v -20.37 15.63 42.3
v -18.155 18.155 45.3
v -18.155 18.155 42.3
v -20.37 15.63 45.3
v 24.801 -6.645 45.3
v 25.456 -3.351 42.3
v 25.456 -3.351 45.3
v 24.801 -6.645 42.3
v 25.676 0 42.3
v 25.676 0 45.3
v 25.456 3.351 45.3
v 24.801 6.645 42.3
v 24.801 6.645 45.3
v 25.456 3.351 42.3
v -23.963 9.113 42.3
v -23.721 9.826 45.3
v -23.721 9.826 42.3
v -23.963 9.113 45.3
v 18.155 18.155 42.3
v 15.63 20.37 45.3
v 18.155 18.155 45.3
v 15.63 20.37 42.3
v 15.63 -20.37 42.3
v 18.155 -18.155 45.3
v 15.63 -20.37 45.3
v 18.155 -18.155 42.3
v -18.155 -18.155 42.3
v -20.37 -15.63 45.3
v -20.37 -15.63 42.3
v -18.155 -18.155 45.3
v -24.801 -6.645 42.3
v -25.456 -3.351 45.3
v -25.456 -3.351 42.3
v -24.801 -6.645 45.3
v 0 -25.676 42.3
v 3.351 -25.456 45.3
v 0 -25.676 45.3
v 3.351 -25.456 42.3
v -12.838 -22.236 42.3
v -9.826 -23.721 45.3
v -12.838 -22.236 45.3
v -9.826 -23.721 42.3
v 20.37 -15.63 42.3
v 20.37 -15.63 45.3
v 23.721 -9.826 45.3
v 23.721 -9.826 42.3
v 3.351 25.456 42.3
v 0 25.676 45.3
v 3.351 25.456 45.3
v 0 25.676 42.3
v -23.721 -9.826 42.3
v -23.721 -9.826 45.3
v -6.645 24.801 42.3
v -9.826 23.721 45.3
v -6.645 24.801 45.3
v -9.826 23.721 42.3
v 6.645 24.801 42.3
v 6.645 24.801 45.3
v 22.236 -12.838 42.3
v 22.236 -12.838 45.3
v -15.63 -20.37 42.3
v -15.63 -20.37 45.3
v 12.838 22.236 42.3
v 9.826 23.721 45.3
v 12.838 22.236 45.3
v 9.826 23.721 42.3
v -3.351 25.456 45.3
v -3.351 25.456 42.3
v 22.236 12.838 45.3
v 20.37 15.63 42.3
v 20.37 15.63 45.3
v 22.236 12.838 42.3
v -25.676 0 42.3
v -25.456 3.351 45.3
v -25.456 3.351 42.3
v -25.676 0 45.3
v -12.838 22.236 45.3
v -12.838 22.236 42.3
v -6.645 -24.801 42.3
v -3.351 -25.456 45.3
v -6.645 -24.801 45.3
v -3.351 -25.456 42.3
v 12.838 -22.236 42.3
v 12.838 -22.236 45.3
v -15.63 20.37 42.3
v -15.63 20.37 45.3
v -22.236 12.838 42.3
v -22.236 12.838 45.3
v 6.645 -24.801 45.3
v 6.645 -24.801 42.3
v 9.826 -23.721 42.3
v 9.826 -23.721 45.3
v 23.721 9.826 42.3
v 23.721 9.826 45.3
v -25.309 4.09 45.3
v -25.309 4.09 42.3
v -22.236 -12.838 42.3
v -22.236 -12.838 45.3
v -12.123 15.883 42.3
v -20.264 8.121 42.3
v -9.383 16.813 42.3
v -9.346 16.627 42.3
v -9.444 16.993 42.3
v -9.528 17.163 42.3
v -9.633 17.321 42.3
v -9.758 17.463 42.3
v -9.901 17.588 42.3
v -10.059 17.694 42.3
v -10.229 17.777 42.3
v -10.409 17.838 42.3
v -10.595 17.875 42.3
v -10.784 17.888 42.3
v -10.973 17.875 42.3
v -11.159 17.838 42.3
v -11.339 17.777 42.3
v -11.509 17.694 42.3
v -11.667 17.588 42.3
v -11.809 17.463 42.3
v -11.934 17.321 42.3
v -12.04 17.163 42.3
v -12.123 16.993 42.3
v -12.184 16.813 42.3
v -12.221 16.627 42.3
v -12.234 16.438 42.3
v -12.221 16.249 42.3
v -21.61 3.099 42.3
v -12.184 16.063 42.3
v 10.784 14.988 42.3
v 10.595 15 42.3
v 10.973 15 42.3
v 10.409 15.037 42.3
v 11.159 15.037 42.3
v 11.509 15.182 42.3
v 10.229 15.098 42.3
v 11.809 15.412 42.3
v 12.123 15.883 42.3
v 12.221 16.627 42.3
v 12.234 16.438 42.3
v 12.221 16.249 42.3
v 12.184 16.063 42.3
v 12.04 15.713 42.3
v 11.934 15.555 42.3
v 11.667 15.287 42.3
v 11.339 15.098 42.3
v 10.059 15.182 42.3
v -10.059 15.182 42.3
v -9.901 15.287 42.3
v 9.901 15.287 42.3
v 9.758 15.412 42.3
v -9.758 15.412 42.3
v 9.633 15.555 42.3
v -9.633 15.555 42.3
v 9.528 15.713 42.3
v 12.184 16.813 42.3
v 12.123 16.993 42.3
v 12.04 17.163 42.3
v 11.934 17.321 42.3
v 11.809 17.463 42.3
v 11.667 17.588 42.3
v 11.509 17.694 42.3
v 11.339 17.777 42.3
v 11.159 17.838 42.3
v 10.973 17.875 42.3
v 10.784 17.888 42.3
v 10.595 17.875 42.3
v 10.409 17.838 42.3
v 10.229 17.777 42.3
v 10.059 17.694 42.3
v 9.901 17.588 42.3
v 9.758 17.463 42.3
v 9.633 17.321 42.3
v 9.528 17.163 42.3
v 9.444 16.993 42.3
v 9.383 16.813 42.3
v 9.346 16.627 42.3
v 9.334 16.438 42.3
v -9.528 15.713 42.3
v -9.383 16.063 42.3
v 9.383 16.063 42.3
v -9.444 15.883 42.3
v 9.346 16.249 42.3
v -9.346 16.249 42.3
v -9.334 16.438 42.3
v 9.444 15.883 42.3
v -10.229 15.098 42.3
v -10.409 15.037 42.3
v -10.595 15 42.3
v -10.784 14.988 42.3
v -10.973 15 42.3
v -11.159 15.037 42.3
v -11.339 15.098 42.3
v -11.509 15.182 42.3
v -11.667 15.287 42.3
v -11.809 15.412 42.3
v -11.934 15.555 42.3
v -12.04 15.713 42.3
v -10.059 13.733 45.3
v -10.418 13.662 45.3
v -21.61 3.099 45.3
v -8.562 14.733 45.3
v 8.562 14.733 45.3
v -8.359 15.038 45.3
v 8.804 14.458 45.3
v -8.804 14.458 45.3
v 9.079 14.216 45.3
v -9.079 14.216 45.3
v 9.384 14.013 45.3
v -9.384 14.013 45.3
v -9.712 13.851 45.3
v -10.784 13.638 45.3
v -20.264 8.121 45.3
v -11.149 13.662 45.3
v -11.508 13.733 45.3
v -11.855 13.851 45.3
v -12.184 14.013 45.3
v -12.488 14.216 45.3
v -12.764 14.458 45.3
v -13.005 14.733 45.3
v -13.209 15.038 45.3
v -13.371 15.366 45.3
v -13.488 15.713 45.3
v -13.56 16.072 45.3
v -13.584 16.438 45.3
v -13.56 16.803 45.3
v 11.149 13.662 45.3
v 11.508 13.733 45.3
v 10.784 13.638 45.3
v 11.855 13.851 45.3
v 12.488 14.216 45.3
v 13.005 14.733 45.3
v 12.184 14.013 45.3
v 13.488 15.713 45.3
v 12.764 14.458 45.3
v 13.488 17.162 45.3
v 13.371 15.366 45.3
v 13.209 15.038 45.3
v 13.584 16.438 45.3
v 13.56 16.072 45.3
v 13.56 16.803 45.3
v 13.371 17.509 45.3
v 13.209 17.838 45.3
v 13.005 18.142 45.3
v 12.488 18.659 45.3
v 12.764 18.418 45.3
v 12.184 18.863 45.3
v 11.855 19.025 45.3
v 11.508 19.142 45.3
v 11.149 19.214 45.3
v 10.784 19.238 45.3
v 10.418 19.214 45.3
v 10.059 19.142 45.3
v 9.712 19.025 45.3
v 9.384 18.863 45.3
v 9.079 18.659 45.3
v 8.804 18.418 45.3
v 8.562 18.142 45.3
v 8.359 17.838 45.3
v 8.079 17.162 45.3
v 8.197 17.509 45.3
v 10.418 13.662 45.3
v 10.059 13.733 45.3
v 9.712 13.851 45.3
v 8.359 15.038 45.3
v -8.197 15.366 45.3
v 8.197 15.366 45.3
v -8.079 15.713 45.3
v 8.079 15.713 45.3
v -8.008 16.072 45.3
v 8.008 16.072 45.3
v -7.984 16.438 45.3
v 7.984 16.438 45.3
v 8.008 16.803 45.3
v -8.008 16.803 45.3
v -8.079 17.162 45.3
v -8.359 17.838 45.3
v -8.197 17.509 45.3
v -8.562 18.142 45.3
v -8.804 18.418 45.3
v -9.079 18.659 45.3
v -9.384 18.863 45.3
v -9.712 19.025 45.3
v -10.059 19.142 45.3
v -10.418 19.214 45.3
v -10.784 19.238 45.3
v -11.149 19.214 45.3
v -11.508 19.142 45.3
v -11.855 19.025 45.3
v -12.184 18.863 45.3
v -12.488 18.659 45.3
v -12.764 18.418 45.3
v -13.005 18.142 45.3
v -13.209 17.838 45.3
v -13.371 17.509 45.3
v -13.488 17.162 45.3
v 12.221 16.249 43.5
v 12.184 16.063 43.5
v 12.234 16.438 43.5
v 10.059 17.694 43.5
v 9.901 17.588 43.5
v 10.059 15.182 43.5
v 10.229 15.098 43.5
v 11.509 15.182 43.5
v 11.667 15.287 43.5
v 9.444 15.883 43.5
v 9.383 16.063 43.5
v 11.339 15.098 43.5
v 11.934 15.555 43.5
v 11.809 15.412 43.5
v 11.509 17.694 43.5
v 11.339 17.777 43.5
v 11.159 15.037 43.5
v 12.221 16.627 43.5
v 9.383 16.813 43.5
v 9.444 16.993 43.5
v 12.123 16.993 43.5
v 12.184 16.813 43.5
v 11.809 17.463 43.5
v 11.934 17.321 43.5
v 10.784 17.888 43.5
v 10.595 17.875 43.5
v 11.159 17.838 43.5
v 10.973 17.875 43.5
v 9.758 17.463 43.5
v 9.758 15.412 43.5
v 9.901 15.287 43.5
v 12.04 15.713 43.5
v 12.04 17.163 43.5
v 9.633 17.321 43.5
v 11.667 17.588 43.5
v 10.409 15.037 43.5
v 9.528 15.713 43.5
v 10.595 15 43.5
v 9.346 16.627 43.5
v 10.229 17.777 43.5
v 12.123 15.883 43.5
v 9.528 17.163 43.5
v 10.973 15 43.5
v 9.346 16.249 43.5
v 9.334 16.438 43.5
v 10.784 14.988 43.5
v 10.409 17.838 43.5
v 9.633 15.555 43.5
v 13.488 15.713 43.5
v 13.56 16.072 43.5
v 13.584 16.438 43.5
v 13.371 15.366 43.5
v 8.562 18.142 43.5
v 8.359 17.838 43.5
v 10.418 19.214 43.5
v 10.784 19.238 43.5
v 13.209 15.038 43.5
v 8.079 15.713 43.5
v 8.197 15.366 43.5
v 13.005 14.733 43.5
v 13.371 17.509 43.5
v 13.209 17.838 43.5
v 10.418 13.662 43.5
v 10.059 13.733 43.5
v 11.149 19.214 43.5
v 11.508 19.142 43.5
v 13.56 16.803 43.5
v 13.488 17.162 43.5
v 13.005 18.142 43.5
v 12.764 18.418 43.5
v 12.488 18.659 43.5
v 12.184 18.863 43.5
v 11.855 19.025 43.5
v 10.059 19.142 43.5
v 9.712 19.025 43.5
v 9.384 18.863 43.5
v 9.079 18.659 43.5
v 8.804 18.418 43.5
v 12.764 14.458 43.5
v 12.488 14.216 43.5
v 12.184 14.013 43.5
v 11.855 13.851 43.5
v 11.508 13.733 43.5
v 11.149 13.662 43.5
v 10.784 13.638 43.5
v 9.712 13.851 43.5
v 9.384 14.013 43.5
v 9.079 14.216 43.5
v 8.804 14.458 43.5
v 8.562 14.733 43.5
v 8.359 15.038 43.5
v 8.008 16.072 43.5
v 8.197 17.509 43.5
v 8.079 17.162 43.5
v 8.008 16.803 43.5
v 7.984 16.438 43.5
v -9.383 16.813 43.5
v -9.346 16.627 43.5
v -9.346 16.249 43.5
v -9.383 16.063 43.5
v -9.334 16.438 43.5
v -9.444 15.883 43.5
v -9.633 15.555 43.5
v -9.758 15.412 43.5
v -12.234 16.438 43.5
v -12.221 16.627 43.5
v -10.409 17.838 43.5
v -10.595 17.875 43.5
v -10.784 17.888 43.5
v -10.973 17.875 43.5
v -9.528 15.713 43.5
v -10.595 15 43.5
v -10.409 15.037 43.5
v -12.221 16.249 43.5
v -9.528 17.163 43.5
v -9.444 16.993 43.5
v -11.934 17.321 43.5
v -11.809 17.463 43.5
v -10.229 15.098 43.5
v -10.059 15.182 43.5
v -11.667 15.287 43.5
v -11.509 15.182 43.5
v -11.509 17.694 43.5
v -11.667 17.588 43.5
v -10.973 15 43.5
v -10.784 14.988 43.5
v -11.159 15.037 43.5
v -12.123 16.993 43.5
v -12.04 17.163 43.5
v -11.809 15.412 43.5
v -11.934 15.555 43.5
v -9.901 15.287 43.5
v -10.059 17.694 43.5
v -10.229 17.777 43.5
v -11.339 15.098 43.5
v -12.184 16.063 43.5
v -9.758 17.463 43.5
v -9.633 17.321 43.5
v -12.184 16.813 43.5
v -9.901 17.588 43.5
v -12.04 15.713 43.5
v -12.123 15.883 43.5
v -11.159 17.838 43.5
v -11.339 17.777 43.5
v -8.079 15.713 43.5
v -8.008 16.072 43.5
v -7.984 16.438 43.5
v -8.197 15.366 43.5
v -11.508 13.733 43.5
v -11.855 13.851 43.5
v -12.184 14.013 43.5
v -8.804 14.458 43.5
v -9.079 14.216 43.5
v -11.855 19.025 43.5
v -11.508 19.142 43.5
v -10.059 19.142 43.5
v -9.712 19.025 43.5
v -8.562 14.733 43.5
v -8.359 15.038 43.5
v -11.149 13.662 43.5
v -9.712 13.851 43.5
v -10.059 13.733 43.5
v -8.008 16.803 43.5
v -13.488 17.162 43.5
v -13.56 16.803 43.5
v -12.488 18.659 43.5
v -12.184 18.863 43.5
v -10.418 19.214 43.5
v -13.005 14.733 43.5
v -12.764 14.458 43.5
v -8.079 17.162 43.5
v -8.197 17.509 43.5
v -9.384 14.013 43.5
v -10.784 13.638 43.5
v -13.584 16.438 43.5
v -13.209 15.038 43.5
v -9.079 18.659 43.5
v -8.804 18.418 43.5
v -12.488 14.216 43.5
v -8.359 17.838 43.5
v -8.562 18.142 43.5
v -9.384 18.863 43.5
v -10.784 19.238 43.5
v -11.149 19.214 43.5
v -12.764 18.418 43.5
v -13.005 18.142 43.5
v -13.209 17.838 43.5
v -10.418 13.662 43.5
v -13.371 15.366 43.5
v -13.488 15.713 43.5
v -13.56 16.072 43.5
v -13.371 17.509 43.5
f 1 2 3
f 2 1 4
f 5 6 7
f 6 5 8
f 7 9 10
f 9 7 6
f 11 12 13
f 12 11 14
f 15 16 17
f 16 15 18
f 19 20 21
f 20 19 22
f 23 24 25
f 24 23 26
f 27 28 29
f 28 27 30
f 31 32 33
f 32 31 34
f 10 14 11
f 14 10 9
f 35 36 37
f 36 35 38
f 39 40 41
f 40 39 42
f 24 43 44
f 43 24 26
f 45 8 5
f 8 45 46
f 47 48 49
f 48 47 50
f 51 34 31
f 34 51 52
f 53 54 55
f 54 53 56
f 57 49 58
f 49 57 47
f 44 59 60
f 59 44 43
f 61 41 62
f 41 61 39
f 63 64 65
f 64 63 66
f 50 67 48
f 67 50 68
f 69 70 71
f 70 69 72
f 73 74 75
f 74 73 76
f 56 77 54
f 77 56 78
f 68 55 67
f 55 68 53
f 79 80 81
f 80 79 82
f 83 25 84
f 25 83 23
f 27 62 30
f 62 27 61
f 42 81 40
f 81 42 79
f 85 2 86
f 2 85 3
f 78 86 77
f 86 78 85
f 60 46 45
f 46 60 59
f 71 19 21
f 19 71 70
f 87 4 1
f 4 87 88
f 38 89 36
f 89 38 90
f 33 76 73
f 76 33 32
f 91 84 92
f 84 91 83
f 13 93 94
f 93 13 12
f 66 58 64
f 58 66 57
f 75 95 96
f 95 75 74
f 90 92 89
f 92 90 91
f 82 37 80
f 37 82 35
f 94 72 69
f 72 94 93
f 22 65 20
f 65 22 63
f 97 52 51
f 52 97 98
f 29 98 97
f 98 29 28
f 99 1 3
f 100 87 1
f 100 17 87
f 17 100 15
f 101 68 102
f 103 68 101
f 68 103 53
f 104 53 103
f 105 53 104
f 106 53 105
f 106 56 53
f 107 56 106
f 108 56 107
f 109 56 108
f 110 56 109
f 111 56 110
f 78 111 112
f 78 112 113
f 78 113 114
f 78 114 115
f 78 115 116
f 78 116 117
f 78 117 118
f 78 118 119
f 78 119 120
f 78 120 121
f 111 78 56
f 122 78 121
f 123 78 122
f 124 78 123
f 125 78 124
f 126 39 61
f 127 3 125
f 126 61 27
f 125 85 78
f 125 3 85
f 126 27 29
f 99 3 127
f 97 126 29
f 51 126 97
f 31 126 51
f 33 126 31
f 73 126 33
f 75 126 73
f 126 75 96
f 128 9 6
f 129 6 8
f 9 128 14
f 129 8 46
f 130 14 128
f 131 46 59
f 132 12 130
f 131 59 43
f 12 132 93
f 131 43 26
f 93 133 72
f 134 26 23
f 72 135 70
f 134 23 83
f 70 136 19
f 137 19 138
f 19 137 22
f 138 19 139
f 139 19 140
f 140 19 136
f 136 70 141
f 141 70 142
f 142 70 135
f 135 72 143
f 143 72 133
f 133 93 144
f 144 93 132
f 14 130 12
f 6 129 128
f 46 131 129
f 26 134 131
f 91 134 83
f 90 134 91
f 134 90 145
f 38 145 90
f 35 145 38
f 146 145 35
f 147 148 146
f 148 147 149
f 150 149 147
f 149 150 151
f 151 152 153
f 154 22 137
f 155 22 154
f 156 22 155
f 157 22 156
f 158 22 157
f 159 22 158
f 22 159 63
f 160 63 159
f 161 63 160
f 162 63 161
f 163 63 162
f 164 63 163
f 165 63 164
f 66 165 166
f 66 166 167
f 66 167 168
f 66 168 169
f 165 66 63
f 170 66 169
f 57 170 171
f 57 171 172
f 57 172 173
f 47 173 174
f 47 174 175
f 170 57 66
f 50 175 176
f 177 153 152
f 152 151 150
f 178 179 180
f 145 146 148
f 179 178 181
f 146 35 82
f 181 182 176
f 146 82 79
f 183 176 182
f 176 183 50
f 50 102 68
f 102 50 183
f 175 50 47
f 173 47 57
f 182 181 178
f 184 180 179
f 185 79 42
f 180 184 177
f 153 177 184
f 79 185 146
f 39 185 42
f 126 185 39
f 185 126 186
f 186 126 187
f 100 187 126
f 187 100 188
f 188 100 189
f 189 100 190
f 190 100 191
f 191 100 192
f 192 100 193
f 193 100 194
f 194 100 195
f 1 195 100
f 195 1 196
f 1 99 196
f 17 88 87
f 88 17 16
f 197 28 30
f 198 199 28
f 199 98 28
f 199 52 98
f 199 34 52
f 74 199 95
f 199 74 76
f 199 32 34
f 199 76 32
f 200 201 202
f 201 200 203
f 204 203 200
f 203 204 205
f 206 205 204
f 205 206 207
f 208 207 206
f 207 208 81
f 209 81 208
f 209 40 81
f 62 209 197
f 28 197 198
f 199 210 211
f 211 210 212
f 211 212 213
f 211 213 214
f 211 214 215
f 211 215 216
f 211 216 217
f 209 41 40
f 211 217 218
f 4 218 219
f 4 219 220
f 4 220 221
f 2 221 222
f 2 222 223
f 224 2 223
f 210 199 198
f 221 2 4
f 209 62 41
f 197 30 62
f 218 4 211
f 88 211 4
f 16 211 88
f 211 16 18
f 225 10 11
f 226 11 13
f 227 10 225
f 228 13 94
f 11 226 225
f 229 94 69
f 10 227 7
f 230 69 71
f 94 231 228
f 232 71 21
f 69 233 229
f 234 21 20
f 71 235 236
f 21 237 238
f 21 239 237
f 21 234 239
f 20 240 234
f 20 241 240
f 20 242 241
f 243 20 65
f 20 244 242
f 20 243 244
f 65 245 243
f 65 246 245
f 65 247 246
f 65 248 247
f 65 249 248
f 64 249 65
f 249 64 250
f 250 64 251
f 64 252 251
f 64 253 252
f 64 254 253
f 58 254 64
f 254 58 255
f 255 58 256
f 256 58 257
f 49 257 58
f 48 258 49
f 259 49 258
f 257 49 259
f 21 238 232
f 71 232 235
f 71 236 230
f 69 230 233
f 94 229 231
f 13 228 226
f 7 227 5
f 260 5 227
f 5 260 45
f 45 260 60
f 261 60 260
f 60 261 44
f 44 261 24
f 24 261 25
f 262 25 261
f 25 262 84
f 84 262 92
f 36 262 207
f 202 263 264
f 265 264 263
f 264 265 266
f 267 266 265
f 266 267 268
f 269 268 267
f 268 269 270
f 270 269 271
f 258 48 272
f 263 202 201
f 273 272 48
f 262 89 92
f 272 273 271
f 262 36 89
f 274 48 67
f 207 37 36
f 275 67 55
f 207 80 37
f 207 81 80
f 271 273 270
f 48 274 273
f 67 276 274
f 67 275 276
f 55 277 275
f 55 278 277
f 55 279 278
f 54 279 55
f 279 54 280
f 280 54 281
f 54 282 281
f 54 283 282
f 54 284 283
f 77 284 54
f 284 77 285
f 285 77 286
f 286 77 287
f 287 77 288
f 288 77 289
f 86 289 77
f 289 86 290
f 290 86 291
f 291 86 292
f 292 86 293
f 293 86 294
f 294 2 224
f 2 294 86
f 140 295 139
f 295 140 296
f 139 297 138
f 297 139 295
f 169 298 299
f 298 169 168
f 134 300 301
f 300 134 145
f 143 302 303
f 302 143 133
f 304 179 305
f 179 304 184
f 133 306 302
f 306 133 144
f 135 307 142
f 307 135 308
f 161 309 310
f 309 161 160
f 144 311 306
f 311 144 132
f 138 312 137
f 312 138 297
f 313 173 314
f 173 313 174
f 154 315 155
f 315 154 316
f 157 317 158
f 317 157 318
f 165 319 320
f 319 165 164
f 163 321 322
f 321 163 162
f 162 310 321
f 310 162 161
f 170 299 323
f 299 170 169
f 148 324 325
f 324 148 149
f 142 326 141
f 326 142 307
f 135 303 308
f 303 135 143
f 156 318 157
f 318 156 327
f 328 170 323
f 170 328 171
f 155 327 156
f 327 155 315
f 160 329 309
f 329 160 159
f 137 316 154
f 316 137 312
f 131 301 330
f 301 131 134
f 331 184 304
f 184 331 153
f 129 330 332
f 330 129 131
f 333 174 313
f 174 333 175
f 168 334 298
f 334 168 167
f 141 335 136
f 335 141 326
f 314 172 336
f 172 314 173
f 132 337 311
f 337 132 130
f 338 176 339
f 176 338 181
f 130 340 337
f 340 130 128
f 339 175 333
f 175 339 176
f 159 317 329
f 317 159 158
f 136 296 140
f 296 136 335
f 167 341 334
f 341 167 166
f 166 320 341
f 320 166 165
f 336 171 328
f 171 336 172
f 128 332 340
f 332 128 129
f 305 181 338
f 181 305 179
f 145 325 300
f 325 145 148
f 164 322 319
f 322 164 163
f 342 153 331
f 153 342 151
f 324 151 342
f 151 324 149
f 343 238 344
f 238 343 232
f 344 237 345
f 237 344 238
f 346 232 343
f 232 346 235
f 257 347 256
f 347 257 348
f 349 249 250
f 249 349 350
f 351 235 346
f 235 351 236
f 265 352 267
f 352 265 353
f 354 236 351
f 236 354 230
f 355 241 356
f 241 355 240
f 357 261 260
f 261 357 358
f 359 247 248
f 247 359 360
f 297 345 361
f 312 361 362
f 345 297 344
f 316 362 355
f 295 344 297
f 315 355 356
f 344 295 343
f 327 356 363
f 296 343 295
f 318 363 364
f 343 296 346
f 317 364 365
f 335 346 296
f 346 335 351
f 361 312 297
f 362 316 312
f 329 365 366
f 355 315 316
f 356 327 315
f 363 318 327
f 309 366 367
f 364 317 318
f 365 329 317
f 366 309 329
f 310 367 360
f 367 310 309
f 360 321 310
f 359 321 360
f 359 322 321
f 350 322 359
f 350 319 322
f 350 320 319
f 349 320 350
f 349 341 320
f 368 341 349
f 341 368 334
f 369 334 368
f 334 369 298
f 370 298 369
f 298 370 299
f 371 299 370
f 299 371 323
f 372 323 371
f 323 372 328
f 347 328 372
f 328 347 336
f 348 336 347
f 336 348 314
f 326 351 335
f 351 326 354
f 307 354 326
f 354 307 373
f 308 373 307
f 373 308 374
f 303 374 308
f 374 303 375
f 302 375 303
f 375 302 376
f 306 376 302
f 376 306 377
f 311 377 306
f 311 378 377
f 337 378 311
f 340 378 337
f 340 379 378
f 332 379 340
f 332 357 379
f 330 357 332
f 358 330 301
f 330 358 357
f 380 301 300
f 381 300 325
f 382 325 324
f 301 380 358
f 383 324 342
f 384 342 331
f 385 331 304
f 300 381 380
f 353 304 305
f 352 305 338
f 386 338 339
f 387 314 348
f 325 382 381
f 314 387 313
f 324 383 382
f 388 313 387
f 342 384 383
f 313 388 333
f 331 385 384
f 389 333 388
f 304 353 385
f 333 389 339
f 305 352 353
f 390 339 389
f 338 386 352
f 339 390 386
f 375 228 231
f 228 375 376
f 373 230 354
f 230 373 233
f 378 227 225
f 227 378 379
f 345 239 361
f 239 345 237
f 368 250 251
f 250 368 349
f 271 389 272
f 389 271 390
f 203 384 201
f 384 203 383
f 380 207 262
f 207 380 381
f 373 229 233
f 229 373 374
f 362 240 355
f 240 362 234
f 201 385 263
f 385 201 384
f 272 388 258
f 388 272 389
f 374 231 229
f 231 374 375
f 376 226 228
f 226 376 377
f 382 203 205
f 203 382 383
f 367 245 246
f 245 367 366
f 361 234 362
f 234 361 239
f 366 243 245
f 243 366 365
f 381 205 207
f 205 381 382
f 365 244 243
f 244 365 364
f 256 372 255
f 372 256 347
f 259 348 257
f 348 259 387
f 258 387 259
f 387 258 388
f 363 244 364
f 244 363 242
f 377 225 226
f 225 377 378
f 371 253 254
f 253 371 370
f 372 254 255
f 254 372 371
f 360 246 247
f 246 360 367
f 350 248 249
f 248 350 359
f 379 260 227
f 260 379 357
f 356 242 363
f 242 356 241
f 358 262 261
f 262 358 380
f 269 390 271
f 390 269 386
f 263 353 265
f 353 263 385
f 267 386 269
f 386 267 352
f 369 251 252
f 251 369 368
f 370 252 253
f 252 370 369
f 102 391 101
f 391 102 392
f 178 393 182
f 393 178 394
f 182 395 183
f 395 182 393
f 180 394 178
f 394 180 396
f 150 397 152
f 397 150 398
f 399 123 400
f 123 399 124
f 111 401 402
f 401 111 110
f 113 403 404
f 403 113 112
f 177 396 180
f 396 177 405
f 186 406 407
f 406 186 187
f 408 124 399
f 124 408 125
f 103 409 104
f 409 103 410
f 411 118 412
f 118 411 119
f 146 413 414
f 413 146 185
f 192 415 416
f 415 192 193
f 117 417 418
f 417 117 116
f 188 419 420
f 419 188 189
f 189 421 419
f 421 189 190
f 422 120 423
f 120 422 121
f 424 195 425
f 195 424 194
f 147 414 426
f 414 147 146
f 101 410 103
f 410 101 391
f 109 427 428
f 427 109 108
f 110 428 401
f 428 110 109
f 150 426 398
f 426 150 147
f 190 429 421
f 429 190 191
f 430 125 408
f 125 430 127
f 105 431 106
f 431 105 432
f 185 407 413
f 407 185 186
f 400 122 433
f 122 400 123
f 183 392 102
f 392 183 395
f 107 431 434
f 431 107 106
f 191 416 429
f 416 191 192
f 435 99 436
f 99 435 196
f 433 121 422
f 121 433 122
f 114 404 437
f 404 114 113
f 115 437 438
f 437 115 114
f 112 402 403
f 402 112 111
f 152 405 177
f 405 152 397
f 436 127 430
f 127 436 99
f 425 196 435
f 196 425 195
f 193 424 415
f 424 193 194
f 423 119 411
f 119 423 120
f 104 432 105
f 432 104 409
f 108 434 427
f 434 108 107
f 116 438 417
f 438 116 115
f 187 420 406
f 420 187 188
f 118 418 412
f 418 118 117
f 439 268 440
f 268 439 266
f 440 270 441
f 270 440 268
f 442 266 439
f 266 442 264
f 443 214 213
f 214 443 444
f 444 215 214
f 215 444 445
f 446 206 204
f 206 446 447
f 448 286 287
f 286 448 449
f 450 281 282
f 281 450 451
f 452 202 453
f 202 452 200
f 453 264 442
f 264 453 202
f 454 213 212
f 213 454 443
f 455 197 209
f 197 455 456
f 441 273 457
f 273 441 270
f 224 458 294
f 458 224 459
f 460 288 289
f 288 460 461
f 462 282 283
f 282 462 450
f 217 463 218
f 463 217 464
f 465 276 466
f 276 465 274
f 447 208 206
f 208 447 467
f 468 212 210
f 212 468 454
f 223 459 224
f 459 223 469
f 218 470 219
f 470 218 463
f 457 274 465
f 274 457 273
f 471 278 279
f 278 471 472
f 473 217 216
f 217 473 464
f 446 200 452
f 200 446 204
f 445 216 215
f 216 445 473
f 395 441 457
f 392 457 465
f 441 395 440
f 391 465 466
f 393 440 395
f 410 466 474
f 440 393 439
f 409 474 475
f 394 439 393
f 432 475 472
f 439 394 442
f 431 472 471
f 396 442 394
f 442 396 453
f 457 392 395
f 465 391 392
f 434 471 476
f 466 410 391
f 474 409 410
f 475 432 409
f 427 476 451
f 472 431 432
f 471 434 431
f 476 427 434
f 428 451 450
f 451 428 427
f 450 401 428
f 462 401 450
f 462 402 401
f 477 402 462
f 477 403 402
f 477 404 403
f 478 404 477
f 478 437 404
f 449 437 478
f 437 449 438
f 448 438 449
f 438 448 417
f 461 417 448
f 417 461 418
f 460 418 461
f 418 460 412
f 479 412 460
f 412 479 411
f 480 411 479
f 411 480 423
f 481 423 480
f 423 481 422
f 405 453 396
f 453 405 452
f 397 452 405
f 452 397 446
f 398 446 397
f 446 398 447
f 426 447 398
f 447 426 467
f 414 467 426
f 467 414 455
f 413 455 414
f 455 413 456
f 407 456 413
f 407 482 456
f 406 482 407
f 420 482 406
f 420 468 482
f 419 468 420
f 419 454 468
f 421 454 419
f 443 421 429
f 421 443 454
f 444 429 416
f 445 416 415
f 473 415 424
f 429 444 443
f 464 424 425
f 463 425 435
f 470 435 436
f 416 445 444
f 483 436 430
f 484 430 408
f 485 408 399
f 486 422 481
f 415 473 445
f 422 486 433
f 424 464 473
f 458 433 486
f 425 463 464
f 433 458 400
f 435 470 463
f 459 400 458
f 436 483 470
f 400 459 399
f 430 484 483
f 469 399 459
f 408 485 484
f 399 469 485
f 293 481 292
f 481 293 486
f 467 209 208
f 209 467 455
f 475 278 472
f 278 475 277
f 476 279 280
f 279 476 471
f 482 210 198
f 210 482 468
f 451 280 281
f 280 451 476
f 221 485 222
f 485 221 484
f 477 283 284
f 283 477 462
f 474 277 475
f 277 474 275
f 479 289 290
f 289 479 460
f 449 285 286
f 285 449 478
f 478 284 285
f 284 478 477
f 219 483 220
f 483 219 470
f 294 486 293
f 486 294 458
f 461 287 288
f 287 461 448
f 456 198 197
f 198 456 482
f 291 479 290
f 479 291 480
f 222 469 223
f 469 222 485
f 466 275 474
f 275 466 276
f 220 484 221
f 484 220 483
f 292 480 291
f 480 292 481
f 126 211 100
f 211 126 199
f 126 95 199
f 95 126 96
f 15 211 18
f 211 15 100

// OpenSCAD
// right cartridge_cap_elbow: press F6 (render) then File > Export > STL
include <../lib/g1_servo_arm.scad>
side = "right";
part = "cartridge_cap_elbow";
